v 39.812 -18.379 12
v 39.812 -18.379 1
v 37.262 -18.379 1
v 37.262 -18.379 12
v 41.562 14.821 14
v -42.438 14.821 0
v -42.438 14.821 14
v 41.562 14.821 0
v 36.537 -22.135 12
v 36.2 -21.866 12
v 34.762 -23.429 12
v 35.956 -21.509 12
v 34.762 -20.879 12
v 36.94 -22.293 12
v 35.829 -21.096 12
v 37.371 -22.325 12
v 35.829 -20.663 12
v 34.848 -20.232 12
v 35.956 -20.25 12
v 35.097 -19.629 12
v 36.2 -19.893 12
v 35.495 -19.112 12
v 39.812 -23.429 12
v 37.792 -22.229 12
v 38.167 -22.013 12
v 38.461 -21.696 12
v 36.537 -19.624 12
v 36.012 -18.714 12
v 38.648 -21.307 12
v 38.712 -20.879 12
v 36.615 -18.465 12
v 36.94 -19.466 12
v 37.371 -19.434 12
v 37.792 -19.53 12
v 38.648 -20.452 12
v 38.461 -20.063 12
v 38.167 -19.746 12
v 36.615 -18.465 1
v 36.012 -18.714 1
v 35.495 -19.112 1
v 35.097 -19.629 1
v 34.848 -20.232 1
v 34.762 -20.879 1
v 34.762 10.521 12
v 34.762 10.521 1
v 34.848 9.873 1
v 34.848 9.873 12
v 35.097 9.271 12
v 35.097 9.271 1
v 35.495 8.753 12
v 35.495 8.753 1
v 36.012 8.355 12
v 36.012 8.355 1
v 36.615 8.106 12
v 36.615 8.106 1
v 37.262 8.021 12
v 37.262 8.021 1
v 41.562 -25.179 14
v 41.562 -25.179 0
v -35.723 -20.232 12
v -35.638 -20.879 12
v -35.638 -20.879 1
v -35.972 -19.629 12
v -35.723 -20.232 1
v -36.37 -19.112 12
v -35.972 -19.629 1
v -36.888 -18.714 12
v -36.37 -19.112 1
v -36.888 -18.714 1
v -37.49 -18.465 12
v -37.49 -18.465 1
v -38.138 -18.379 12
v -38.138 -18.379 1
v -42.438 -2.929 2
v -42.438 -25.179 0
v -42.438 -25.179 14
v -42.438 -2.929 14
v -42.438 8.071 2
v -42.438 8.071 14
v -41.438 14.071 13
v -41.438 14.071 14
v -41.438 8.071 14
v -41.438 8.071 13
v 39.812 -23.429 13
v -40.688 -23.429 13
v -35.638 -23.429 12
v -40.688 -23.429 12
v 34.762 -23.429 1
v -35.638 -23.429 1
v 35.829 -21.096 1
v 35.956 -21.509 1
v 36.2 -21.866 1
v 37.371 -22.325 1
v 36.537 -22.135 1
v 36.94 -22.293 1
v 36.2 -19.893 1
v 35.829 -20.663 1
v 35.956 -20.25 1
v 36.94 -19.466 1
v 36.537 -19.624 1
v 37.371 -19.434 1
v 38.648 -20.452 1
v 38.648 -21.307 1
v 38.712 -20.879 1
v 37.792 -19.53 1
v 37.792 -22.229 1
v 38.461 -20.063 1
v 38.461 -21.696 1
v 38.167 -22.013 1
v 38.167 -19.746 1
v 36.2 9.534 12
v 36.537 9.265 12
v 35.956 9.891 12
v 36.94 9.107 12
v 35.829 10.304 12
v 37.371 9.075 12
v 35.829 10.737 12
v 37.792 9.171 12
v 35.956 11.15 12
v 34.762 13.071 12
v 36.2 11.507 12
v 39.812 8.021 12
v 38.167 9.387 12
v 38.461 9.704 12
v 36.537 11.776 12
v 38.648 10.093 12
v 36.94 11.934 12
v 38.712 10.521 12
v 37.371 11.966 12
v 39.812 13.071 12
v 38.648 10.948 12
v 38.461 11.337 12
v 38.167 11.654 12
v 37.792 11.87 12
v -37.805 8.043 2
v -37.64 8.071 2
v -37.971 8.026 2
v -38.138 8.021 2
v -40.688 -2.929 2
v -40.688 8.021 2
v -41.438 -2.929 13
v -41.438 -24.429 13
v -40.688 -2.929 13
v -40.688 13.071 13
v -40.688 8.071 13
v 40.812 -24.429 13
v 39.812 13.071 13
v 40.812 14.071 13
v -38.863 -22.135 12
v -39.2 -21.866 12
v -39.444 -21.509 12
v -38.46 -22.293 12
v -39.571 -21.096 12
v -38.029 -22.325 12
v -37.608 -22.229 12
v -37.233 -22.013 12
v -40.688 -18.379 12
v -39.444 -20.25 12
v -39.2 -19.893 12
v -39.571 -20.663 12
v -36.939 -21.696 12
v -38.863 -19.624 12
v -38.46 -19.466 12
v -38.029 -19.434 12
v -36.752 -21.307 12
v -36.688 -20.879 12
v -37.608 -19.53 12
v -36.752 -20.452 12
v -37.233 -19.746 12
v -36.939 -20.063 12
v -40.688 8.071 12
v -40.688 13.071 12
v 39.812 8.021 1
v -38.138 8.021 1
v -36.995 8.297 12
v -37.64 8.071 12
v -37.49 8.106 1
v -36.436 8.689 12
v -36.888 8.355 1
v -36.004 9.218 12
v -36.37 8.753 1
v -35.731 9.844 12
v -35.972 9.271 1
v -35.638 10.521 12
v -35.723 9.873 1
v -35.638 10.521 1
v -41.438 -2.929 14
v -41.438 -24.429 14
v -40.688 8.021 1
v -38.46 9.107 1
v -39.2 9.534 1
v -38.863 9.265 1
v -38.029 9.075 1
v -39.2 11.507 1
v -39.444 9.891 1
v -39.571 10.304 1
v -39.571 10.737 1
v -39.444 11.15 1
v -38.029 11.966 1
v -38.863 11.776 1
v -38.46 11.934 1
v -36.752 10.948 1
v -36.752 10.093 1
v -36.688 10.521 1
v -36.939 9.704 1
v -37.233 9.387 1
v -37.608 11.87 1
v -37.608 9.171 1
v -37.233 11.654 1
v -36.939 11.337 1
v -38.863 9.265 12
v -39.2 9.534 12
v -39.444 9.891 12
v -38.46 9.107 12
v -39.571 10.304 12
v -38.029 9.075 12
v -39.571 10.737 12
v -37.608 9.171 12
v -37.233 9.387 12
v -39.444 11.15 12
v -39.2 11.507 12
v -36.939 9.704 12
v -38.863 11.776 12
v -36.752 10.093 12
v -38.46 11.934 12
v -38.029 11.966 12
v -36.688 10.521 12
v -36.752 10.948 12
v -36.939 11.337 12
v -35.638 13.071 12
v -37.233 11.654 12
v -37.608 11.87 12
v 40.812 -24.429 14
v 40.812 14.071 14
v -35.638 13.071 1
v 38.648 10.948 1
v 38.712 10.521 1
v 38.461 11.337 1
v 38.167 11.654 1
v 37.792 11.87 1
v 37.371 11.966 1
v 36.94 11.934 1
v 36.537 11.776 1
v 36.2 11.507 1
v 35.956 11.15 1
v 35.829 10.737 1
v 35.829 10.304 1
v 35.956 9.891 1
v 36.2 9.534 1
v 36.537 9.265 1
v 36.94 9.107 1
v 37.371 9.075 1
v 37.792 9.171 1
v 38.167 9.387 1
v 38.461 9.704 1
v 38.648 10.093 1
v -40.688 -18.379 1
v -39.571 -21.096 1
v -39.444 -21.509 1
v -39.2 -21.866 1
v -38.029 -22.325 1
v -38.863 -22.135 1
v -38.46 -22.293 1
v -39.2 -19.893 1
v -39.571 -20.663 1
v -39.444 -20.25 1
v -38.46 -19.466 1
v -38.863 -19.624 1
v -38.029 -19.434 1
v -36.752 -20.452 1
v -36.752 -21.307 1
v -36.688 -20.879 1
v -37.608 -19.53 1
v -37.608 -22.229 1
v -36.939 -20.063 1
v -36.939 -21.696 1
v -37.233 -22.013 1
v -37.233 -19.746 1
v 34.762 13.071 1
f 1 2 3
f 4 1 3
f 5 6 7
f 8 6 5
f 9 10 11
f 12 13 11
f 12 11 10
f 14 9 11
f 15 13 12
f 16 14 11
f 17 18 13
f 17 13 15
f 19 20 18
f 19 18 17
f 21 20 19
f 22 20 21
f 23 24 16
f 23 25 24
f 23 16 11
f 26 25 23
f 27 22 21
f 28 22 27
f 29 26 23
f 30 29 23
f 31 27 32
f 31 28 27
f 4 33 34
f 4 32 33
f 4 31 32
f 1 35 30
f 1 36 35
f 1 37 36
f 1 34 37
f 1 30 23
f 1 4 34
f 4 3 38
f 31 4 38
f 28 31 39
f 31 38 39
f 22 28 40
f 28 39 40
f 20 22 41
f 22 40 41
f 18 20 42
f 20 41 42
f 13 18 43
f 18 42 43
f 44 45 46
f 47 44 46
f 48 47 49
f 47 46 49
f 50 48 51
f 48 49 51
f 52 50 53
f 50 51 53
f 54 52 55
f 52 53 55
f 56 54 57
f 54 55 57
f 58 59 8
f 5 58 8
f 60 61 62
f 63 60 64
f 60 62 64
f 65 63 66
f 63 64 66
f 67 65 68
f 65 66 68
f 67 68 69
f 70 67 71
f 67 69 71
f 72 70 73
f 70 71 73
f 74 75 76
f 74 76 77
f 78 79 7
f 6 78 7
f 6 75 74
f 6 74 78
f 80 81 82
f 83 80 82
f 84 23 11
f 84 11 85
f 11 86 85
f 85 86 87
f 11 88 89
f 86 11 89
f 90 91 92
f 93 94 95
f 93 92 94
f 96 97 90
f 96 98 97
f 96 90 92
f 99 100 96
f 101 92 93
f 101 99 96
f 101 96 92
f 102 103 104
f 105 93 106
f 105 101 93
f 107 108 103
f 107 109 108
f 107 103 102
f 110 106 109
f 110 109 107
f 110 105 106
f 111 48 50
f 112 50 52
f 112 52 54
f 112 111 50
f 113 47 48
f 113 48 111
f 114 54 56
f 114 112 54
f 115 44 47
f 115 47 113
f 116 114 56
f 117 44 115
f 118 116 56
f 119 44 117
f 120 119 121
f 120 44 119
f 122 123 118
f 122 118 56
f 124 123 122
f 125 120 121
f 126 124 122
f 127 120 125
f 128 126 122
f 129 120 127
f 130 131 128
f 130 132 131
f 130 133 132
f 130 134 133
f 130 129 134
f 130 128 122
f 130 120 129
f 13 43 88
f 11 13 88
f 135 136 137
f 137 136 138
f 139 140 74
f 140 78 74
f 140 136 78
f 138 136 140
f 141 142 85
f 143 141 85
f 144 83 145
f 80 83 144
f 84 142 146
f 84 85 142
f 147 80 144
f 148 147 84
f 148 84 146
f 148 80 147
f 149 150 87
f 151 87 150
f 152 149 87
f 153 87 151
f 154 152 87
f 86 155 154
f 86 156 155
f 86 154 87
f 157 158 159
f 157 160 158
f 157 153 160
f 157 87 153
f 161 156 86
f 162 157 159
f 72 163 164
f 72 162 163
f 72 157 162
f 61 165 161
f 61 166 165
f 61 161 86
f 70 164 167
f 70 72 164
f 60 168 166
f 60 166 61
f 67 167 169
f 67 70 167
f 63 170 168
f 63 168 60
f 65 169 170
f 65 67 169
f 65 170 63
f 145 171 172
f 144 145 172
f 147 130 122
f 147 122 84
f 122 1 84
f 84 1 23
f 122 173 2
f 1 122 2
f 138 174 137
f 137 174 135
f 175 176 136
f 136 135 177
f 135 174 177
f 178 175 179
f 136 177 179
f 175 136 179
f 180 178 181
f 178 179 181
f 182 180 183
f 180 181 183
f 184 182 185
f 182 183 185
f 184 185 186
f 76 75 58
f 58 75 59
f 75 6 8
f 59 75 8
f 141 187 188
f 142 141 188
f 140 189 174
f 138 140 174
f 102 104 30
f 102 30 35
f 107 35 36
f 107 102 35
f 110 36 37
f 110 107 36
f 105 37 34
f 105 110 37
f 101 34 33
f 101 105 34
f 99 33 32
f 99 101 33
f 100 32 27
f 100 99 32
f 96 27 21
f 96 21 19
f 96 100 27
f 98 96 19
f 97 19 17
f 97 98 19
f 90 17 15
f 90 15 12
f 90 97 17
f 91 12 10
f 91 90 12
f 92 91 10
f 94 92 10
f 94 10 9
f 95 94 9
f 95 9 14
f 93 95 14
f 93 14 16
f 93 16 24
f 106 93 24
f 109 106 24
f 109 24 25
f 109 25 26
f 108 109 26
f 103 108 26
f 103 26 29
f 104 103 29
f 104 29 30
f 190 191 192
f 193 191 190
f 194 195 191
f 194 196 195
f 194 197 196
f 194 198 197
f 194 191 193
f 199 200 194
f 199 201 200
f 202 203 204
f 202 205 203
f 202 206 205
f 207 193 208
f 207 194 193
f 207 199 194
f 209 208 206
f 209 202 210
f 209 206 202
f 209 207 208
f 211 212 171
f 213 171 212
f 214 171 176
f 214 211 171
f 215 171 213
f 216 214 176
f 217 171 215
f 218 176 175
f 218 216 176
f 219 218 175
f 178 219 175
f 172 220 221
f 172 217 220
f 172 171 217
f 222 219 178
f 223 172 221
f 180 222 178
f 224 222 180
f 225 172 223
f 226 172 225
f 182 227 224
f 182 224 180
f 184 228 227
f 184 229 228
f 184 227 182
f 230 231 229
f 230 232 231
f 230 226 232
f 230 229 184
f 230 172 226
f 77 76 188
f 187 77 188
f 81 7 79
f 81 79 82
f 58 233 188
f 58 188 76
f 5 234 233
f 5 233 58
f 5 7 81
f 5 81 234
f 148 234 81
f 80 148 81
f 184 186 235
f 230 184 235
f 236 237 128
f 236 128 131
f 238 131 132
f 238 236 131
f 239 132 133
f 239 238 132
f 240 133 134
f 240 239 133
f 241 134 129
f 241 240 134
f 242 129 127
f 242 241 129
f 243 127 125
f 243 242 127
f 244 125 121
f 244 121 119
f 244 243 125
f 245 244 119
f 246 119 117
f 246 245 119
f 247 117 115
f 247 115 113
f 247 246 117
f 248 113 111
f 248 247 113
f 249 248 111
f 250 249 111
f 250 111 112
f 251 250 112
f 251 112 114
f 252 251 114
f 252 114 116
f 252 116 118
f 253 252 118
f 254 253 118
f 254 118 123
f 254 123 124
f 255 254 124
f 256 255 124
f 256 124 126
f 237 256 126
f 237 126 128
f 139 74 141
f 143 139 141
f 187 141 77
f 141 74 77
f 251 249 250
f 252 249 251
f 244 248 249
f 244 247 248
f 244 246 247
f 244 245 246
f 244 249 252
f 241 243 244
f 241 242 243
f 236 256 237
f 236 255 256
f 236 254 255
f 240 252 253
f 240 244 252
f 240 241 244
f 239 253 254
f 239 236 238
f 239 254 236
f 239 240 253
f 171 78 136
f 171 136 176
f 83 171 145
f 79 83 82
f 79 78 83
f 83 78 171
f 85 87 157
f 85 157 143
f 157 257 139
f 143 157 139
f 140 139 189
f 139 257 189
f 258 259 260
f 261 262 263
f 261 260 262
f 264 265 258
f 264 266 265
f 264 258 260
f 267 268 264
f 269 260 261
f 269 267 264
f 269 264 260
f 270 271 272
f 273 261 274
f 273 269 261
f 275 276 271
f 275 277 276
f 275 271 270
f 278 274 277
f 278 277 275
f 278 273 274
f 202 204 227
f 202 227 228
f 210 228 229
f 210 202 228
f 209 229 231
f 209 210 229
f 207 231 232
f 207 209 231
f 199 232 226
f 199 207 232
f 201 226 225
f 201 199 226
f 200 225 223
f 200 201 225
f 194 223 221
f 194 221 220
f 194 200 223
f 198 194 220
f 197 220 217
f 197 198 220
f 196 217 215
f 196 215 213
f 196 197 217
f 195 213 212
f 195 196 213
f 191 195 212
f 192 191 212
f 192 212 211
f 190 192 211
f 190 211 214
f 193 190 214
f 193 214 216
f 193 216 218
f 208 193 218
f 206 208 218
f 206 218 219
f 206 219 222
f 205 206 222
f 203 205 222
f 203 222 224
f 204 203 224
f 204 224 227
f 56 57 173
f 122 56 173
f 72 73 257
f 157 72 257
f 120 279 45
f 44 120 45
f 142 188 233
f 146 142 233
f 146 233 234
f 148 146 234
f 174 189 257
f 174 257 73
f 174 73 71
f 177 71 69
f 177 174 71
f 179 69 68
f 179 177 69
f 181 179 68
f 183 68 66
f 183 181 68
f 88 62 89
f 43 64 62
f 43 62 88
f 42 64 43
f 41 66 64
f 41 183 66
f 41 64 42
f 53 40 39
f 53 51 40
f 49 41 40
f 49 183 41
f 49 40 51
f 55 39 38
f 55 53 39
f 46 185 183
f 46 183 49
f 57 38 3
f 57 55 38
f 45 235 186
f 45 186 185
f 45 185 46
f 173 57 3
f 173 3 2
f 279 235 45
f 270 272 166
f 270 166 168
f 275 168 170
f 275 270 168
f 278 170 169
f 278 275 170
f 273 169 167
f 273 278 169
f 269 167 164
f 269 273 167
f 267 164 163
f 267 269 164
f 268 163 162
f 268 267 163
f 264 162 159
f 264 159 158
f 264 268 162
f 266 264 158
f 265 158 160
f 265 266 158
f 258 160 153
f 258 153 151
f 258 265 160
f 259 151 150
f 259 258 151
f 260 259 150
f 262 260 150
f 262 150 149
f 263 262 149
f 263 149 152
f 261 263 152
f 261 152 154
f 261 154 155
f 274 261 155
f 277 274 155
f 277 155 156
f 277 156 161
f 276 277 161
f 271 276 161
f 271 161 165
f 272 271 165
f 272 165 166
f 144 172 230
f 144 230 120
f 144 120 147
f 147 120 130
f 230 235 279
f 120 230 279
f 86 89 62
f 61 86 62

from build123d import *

# Parameters (mm, degrees)
F0_W     = 84
F0_H     = 40
F0_R     = 1.45
F1_DEPTH = 1
F2_DEPTH = 12
F3_DEPTH = 14
F4_W     = 11
F4_H     = 12
F5_DEPTH = 25
F7_DEPTH = 1


with BuildPart() as f1:
    # F0 (on Top) → F1 (new body)
    with BuildSketch(Plane.XY):
        with Locations((-0.4375013113, -5.1794923829)):
            Rectangle(F0_W, F0_H)
        Polygon((-40.6875013113, 8.0205076171), (-40.6875013113, 13.0705076171), (-35.6375013113, 13.0705076171), (34.7624986887, 13.0705076171), (39.8124986887, 13.0705076171), (39.8124986887, 8.0205076171), (39.8124986887, -18.3794923829), (39.8124986887, -23.4294923829), (34.7624986887, -23.4294923829), (-35.6375013113, -23.4294923829), (-40.6875013113, -23.4294923829), (-40.6875013113, -18.3794923829), align=None, mode=Mode.SUBTRACT)
        with BuildLine():
            Line((34.7624986887, 13.0705076171), (-35.6375013113, 13.0705076171))
            Line((-35.6375013113, 13.0705076171), (-35.6375013113, 10.5205076171))
            ThreePointArc((-35.6375013113, 10.5205076171), (-36.3697343583, 8.7527406642), (-38.1375013113, 8.0205076171))
            Line((-38.1375013113, 8.0205076171), (-40.6875013113, 8.0205076171))
            Line((-40.6875013113, 8.0205076171), (-40.6875013113, -18.3794923829))
            Line((-40.6875013113, -18.3794923829), (-38.1375013113, -18.3794923829))
            ThreePointArc((-38.1375013113, -18.3794923829), (-36.3697343583, -19.1117254299), (-35.6375013113, -20.8794923829))
            Line((-35.6375013113, -20.8794923829), (-35.6375013113, -23.4294923829))
            Line((-35.6375013113, -23.4294923829), (34.7624986887, -23.4294923829))
            Line((34.7624986887, -23.4294923829), (34.7624986887, -20.8794923829))
            ThreePointArc((34.7624986887, -20.8794923829), (35.4947317357, -19.1117254299), (37.2624986887, -18.3794923829))
            Line((37.2624986887, -18.3794923829), (39.8124986887, -18.3794923829))
            Line((39.8124986887, -18.3794923829), (39.8124986887, 8.0205076171))
            Line((39.8124986887, 8.0205076171), (37.2624986887, 8.0205076171))
            ThreePointArc((37.2624986887, 8.0205076171), (35.4947317357, 8.7527406642), (34.7624986887, 10.5205076171))
            Line((34.7624986887, 10.5205076171), (34.7624986887, 13.0705076171))
        make_face()
        with BuildLine():
            Line((39.8124986887, -23.4294923829), (39.8124986887, -18.3794923829))
            Line((39.8124986887, -18.3794923829), (37.2624986887, -18.3794923829))
            ThreePointArc((37.2624986887, -18.3794923829), (35.4947317357, -19.1117254299), (34.7624986887, -20.8794923829))
            Line((34.7624986887, -20.8794923829), (34.7624986887, -23.4294923829))
            Line((34.7624986887, -23.4294923829), (39.8124986887, -23.4294923829))
        make_face()
        with Locations((37.2624986887, -20.8794923829)):
            Circle(F0_R, mode=Mode.SUBTRACT)
        with BuildLine():
            Line((39.8124986887, 13.0705076171), (34.7624986887, 13.0705076171))
            Line((34.7624986887, 13.0705076171), (34.7624986887, 10.5205076171))
            ThreePointArc((34.7624986887, 10.5205076171), (35.4947317357, 8.7527406642), (37.2624986887, 8.0205076171))
            Line((37.2624986887, 8.0205076171), (39.8124986887, 8.0205076171))
            Line((39.8124986887, 8.0205076171), (39.8124986887, 13.0705076171))
        make_face()
        with Locations((37.2624986887, 10.5205076171)):
            Circle(F0_R, mode=Mode.SUBTRACT)
        with BuildLine():
            Line((-38.1375013113, -18.3794923829), (-40.6875013113, -18.3794923829))
            Line((-40.6875013113, -18.3794923829), (-40.6875013113, -23.4294923829))
            Line((-40.6875013113, -23.4294923829), (-35.6375013113, -23.4294923829))
            Line((-35.6375013113, -23.4294923829), (-35.6375013113, -20.8794923829))
            ThreePointArc((-35.6375013113, -20.8794923829), (-36.3697343583, -19.1117254299), (-38.1375013113, -18.3794923829))
        make_face()
        with Locations((-38.1375013113, -20.8794923829)):
            Circle(F0_R, mode=Mode.SUBTRACT)
        with BuildLine():
            Line((-35.6375013113, 13.0705076171), (-40.6875013113, 13.0705076171))
            Line((-40.6875013113, 13.0705076171), (-40.6875013113, 8.0205076171))
            Line((-40.6875013113, 8.0205076171), (-38.1375013113, 8.0205076171))
            ThreePointArc((-38.1375013113, 8.0205076171), (-36.3697343583, 8.7527406642), (-35.6375013113, 10.5205076171))
            Line((-35.6375013113, 10.5205076171), (-35.6375013113, 13.0705076171))
        make_face()
        with Locations((-38.1375013113, 10.5205076171)):
            Circle(F0_R, mode=Mode.SUBTRACT)
        with Locations((37.2624986887, 10.5205076171)):
            Circle(F0_R)
        with Locations((-38.1375013113, 10.5205076171)):
            Circle(F0_R)
        with Locations((37.2624986887, -20.8794923829)):
            Circle(F0_R)
        with Locations((-38.1375013113, -20.8794923829)):
            Circle(F0_R)
    extrude(amount=F1_DEPTH)

    # F0 (on Top) → F2 (join)
    with BuildSketch(Plane.XY):
        with BuildLine():
            Line((-35.6375013113, 13.0705076171), (-40.6875013113, 13.0705076171))
            Line((-40.6875013113, 13.0705076171), (-40.6875013113, 8.0205076171))
            Line((-40.6875013113, 8.0205076171), (-38.1375013113, 8.0205076171))
            ThreePointArc((-38.1375013113, 8.0205076171), (-36.3697343583, 8.7527406642), (-35.6375013113, 10.5205076171))
            Line((-35.6375013113, 10.5205076171), (-35.6375013113, 13.0705076171))
        make_face()
        with Locations((-38.1375013113, 10.5205076171)):
            Circle(F0_R, mode=Mode.SUBTRACT)
        with BuildLine():
            Line((39.8124986887, 13.0705076171), (34.7624986887, 13.0705076171))
            Line((34.7624986887, 13.0705076171), (34.7624986887, 10.5205076171))
            ThreePointArc((34.7624986887, 10.5205076171), (35.4947317357, 8.7527406642), (37.2624986887, 8.0205076171))
            Line((37.2624986887, 8.0205076171), (39.8124986887, 8.0205076171))
            Line((39.8124986887, 8.0205076171), (39.8124986887, 13.0705076171))
        make_face()
        with Locations((37.2624986887, 10.5205076171)):
            Circle(F0_R, mode=Mode.SUBTRACT)
        with BuildLine():
            Line((39.8124986887, -23.4294923829), (39.8124986887, -18.3794923829))
            Line((39.8124986887, -18.3794923829), (37.2624986887, -18.3794923829))
            ThreePointArc((37.2624986887, -18.3794923829), (35.4947317357, -19.1117254299), (34.7624986887, -20.8794923829))
            Line((34.7624986887, -20.8794923829), (34.7624986887, -23.4294923829))
            Line((34.7624986887, -23.4294923829), (39.8124986887, -23.4294923829))
        make_face()
        with Locations((37.2624986887, -20.8794923829)):
            Circle(F0_R, mode=Mode.SUBTRACT)
        with BuildLine():
            Line((-38.1375013113, -18.3794923829), (-40.6875013113, -18.3794923829))
            Line((-40.6875013113, -18.3794923829), (-40.6875013113, -23.4294923829))
            Line((-40.6875013113, -23.4294923829), (-35.6375013113, -23.4294923829))
            Line((-35.6375013113, -23.4294923829), (-35.6375013113, -20.8794923829))
            ThreePointArc((-35.6375013113, -20.8794923829), (-36.3697343583, -19.1117254299), (-38.1375013113, -18.3794923829))
        make_face()
        with Locations((-38.1375013113, -20.8794923829)):
            Circle(F0_R, mode=Mode.SUBTRACT)
    extrude(amount=F2_DEPTH)

    # F0 (on Top) → F3 (join)
    with BuildSketch(Plane.XY):
        with Locations((-0.4375013113, -5.1794923829)):
            Rectangle(F0_W, F0_H)
        Polygon((-40.6875013113, 8.0205076171), (-40.6875013113, 13.0705076171), (-35.6375013113, 13.0705076171), (34.7624986887, 13.0705076171), (39.8124986887, 13.0705076171), (39.8124986887, 8.0205076171), (39.8124986887, -18.3794923829), (39.8124986887, -23.4294923829), (34.7624986887, -23.4294923829), (-35.6375013113, -23.4294923829), (-40.6875013113, -23.4294923829), (-40.6875013113, -18.3794923829), align=None, mode=Mode.SUBTRACT)
    extrude(amount=F3_DEPTH)

    # F4 (on face) → F5 (cut)
    with BuildSketch(Plane(origin=(-42.4375013113, 0, 0), x_dir=(0, -1, 0), z_dir=(-1, 0, 0))):
        with Locations((-2.5705076171, 8)):
            Rectangle(F4_W, F4_H)
    extrude(amount=-F5_DEPTH, mode=Mode.SUBTRACT)

    # F6 (on face) → F7 (cut)
    with BuildSketch(Plane.XY.offset(14)):
        Polygon((40.8124986887, 14.0705076171), (-41.4375013113, 14.0705076171), (-41.4375013113, 8.0705076171), (-40.6875013113, 8.0705076171), (-40.6875013113, 13.0705076171), (39.8124986887, 13.0705076171), (39.8124986887, -23.4294923829), (-40.6875013113, -23.4294923829), (-40.6875013113, -2.9294923829), (-41.4375013113, -2.9294923829), (-41.4375013113, -24.4294923829), (40.8124986887, -24.4294923829), align=None)
    extrude(amount=-F7_DEPTH, mode=Mode.SUBTRACT)


solid = f1.part
